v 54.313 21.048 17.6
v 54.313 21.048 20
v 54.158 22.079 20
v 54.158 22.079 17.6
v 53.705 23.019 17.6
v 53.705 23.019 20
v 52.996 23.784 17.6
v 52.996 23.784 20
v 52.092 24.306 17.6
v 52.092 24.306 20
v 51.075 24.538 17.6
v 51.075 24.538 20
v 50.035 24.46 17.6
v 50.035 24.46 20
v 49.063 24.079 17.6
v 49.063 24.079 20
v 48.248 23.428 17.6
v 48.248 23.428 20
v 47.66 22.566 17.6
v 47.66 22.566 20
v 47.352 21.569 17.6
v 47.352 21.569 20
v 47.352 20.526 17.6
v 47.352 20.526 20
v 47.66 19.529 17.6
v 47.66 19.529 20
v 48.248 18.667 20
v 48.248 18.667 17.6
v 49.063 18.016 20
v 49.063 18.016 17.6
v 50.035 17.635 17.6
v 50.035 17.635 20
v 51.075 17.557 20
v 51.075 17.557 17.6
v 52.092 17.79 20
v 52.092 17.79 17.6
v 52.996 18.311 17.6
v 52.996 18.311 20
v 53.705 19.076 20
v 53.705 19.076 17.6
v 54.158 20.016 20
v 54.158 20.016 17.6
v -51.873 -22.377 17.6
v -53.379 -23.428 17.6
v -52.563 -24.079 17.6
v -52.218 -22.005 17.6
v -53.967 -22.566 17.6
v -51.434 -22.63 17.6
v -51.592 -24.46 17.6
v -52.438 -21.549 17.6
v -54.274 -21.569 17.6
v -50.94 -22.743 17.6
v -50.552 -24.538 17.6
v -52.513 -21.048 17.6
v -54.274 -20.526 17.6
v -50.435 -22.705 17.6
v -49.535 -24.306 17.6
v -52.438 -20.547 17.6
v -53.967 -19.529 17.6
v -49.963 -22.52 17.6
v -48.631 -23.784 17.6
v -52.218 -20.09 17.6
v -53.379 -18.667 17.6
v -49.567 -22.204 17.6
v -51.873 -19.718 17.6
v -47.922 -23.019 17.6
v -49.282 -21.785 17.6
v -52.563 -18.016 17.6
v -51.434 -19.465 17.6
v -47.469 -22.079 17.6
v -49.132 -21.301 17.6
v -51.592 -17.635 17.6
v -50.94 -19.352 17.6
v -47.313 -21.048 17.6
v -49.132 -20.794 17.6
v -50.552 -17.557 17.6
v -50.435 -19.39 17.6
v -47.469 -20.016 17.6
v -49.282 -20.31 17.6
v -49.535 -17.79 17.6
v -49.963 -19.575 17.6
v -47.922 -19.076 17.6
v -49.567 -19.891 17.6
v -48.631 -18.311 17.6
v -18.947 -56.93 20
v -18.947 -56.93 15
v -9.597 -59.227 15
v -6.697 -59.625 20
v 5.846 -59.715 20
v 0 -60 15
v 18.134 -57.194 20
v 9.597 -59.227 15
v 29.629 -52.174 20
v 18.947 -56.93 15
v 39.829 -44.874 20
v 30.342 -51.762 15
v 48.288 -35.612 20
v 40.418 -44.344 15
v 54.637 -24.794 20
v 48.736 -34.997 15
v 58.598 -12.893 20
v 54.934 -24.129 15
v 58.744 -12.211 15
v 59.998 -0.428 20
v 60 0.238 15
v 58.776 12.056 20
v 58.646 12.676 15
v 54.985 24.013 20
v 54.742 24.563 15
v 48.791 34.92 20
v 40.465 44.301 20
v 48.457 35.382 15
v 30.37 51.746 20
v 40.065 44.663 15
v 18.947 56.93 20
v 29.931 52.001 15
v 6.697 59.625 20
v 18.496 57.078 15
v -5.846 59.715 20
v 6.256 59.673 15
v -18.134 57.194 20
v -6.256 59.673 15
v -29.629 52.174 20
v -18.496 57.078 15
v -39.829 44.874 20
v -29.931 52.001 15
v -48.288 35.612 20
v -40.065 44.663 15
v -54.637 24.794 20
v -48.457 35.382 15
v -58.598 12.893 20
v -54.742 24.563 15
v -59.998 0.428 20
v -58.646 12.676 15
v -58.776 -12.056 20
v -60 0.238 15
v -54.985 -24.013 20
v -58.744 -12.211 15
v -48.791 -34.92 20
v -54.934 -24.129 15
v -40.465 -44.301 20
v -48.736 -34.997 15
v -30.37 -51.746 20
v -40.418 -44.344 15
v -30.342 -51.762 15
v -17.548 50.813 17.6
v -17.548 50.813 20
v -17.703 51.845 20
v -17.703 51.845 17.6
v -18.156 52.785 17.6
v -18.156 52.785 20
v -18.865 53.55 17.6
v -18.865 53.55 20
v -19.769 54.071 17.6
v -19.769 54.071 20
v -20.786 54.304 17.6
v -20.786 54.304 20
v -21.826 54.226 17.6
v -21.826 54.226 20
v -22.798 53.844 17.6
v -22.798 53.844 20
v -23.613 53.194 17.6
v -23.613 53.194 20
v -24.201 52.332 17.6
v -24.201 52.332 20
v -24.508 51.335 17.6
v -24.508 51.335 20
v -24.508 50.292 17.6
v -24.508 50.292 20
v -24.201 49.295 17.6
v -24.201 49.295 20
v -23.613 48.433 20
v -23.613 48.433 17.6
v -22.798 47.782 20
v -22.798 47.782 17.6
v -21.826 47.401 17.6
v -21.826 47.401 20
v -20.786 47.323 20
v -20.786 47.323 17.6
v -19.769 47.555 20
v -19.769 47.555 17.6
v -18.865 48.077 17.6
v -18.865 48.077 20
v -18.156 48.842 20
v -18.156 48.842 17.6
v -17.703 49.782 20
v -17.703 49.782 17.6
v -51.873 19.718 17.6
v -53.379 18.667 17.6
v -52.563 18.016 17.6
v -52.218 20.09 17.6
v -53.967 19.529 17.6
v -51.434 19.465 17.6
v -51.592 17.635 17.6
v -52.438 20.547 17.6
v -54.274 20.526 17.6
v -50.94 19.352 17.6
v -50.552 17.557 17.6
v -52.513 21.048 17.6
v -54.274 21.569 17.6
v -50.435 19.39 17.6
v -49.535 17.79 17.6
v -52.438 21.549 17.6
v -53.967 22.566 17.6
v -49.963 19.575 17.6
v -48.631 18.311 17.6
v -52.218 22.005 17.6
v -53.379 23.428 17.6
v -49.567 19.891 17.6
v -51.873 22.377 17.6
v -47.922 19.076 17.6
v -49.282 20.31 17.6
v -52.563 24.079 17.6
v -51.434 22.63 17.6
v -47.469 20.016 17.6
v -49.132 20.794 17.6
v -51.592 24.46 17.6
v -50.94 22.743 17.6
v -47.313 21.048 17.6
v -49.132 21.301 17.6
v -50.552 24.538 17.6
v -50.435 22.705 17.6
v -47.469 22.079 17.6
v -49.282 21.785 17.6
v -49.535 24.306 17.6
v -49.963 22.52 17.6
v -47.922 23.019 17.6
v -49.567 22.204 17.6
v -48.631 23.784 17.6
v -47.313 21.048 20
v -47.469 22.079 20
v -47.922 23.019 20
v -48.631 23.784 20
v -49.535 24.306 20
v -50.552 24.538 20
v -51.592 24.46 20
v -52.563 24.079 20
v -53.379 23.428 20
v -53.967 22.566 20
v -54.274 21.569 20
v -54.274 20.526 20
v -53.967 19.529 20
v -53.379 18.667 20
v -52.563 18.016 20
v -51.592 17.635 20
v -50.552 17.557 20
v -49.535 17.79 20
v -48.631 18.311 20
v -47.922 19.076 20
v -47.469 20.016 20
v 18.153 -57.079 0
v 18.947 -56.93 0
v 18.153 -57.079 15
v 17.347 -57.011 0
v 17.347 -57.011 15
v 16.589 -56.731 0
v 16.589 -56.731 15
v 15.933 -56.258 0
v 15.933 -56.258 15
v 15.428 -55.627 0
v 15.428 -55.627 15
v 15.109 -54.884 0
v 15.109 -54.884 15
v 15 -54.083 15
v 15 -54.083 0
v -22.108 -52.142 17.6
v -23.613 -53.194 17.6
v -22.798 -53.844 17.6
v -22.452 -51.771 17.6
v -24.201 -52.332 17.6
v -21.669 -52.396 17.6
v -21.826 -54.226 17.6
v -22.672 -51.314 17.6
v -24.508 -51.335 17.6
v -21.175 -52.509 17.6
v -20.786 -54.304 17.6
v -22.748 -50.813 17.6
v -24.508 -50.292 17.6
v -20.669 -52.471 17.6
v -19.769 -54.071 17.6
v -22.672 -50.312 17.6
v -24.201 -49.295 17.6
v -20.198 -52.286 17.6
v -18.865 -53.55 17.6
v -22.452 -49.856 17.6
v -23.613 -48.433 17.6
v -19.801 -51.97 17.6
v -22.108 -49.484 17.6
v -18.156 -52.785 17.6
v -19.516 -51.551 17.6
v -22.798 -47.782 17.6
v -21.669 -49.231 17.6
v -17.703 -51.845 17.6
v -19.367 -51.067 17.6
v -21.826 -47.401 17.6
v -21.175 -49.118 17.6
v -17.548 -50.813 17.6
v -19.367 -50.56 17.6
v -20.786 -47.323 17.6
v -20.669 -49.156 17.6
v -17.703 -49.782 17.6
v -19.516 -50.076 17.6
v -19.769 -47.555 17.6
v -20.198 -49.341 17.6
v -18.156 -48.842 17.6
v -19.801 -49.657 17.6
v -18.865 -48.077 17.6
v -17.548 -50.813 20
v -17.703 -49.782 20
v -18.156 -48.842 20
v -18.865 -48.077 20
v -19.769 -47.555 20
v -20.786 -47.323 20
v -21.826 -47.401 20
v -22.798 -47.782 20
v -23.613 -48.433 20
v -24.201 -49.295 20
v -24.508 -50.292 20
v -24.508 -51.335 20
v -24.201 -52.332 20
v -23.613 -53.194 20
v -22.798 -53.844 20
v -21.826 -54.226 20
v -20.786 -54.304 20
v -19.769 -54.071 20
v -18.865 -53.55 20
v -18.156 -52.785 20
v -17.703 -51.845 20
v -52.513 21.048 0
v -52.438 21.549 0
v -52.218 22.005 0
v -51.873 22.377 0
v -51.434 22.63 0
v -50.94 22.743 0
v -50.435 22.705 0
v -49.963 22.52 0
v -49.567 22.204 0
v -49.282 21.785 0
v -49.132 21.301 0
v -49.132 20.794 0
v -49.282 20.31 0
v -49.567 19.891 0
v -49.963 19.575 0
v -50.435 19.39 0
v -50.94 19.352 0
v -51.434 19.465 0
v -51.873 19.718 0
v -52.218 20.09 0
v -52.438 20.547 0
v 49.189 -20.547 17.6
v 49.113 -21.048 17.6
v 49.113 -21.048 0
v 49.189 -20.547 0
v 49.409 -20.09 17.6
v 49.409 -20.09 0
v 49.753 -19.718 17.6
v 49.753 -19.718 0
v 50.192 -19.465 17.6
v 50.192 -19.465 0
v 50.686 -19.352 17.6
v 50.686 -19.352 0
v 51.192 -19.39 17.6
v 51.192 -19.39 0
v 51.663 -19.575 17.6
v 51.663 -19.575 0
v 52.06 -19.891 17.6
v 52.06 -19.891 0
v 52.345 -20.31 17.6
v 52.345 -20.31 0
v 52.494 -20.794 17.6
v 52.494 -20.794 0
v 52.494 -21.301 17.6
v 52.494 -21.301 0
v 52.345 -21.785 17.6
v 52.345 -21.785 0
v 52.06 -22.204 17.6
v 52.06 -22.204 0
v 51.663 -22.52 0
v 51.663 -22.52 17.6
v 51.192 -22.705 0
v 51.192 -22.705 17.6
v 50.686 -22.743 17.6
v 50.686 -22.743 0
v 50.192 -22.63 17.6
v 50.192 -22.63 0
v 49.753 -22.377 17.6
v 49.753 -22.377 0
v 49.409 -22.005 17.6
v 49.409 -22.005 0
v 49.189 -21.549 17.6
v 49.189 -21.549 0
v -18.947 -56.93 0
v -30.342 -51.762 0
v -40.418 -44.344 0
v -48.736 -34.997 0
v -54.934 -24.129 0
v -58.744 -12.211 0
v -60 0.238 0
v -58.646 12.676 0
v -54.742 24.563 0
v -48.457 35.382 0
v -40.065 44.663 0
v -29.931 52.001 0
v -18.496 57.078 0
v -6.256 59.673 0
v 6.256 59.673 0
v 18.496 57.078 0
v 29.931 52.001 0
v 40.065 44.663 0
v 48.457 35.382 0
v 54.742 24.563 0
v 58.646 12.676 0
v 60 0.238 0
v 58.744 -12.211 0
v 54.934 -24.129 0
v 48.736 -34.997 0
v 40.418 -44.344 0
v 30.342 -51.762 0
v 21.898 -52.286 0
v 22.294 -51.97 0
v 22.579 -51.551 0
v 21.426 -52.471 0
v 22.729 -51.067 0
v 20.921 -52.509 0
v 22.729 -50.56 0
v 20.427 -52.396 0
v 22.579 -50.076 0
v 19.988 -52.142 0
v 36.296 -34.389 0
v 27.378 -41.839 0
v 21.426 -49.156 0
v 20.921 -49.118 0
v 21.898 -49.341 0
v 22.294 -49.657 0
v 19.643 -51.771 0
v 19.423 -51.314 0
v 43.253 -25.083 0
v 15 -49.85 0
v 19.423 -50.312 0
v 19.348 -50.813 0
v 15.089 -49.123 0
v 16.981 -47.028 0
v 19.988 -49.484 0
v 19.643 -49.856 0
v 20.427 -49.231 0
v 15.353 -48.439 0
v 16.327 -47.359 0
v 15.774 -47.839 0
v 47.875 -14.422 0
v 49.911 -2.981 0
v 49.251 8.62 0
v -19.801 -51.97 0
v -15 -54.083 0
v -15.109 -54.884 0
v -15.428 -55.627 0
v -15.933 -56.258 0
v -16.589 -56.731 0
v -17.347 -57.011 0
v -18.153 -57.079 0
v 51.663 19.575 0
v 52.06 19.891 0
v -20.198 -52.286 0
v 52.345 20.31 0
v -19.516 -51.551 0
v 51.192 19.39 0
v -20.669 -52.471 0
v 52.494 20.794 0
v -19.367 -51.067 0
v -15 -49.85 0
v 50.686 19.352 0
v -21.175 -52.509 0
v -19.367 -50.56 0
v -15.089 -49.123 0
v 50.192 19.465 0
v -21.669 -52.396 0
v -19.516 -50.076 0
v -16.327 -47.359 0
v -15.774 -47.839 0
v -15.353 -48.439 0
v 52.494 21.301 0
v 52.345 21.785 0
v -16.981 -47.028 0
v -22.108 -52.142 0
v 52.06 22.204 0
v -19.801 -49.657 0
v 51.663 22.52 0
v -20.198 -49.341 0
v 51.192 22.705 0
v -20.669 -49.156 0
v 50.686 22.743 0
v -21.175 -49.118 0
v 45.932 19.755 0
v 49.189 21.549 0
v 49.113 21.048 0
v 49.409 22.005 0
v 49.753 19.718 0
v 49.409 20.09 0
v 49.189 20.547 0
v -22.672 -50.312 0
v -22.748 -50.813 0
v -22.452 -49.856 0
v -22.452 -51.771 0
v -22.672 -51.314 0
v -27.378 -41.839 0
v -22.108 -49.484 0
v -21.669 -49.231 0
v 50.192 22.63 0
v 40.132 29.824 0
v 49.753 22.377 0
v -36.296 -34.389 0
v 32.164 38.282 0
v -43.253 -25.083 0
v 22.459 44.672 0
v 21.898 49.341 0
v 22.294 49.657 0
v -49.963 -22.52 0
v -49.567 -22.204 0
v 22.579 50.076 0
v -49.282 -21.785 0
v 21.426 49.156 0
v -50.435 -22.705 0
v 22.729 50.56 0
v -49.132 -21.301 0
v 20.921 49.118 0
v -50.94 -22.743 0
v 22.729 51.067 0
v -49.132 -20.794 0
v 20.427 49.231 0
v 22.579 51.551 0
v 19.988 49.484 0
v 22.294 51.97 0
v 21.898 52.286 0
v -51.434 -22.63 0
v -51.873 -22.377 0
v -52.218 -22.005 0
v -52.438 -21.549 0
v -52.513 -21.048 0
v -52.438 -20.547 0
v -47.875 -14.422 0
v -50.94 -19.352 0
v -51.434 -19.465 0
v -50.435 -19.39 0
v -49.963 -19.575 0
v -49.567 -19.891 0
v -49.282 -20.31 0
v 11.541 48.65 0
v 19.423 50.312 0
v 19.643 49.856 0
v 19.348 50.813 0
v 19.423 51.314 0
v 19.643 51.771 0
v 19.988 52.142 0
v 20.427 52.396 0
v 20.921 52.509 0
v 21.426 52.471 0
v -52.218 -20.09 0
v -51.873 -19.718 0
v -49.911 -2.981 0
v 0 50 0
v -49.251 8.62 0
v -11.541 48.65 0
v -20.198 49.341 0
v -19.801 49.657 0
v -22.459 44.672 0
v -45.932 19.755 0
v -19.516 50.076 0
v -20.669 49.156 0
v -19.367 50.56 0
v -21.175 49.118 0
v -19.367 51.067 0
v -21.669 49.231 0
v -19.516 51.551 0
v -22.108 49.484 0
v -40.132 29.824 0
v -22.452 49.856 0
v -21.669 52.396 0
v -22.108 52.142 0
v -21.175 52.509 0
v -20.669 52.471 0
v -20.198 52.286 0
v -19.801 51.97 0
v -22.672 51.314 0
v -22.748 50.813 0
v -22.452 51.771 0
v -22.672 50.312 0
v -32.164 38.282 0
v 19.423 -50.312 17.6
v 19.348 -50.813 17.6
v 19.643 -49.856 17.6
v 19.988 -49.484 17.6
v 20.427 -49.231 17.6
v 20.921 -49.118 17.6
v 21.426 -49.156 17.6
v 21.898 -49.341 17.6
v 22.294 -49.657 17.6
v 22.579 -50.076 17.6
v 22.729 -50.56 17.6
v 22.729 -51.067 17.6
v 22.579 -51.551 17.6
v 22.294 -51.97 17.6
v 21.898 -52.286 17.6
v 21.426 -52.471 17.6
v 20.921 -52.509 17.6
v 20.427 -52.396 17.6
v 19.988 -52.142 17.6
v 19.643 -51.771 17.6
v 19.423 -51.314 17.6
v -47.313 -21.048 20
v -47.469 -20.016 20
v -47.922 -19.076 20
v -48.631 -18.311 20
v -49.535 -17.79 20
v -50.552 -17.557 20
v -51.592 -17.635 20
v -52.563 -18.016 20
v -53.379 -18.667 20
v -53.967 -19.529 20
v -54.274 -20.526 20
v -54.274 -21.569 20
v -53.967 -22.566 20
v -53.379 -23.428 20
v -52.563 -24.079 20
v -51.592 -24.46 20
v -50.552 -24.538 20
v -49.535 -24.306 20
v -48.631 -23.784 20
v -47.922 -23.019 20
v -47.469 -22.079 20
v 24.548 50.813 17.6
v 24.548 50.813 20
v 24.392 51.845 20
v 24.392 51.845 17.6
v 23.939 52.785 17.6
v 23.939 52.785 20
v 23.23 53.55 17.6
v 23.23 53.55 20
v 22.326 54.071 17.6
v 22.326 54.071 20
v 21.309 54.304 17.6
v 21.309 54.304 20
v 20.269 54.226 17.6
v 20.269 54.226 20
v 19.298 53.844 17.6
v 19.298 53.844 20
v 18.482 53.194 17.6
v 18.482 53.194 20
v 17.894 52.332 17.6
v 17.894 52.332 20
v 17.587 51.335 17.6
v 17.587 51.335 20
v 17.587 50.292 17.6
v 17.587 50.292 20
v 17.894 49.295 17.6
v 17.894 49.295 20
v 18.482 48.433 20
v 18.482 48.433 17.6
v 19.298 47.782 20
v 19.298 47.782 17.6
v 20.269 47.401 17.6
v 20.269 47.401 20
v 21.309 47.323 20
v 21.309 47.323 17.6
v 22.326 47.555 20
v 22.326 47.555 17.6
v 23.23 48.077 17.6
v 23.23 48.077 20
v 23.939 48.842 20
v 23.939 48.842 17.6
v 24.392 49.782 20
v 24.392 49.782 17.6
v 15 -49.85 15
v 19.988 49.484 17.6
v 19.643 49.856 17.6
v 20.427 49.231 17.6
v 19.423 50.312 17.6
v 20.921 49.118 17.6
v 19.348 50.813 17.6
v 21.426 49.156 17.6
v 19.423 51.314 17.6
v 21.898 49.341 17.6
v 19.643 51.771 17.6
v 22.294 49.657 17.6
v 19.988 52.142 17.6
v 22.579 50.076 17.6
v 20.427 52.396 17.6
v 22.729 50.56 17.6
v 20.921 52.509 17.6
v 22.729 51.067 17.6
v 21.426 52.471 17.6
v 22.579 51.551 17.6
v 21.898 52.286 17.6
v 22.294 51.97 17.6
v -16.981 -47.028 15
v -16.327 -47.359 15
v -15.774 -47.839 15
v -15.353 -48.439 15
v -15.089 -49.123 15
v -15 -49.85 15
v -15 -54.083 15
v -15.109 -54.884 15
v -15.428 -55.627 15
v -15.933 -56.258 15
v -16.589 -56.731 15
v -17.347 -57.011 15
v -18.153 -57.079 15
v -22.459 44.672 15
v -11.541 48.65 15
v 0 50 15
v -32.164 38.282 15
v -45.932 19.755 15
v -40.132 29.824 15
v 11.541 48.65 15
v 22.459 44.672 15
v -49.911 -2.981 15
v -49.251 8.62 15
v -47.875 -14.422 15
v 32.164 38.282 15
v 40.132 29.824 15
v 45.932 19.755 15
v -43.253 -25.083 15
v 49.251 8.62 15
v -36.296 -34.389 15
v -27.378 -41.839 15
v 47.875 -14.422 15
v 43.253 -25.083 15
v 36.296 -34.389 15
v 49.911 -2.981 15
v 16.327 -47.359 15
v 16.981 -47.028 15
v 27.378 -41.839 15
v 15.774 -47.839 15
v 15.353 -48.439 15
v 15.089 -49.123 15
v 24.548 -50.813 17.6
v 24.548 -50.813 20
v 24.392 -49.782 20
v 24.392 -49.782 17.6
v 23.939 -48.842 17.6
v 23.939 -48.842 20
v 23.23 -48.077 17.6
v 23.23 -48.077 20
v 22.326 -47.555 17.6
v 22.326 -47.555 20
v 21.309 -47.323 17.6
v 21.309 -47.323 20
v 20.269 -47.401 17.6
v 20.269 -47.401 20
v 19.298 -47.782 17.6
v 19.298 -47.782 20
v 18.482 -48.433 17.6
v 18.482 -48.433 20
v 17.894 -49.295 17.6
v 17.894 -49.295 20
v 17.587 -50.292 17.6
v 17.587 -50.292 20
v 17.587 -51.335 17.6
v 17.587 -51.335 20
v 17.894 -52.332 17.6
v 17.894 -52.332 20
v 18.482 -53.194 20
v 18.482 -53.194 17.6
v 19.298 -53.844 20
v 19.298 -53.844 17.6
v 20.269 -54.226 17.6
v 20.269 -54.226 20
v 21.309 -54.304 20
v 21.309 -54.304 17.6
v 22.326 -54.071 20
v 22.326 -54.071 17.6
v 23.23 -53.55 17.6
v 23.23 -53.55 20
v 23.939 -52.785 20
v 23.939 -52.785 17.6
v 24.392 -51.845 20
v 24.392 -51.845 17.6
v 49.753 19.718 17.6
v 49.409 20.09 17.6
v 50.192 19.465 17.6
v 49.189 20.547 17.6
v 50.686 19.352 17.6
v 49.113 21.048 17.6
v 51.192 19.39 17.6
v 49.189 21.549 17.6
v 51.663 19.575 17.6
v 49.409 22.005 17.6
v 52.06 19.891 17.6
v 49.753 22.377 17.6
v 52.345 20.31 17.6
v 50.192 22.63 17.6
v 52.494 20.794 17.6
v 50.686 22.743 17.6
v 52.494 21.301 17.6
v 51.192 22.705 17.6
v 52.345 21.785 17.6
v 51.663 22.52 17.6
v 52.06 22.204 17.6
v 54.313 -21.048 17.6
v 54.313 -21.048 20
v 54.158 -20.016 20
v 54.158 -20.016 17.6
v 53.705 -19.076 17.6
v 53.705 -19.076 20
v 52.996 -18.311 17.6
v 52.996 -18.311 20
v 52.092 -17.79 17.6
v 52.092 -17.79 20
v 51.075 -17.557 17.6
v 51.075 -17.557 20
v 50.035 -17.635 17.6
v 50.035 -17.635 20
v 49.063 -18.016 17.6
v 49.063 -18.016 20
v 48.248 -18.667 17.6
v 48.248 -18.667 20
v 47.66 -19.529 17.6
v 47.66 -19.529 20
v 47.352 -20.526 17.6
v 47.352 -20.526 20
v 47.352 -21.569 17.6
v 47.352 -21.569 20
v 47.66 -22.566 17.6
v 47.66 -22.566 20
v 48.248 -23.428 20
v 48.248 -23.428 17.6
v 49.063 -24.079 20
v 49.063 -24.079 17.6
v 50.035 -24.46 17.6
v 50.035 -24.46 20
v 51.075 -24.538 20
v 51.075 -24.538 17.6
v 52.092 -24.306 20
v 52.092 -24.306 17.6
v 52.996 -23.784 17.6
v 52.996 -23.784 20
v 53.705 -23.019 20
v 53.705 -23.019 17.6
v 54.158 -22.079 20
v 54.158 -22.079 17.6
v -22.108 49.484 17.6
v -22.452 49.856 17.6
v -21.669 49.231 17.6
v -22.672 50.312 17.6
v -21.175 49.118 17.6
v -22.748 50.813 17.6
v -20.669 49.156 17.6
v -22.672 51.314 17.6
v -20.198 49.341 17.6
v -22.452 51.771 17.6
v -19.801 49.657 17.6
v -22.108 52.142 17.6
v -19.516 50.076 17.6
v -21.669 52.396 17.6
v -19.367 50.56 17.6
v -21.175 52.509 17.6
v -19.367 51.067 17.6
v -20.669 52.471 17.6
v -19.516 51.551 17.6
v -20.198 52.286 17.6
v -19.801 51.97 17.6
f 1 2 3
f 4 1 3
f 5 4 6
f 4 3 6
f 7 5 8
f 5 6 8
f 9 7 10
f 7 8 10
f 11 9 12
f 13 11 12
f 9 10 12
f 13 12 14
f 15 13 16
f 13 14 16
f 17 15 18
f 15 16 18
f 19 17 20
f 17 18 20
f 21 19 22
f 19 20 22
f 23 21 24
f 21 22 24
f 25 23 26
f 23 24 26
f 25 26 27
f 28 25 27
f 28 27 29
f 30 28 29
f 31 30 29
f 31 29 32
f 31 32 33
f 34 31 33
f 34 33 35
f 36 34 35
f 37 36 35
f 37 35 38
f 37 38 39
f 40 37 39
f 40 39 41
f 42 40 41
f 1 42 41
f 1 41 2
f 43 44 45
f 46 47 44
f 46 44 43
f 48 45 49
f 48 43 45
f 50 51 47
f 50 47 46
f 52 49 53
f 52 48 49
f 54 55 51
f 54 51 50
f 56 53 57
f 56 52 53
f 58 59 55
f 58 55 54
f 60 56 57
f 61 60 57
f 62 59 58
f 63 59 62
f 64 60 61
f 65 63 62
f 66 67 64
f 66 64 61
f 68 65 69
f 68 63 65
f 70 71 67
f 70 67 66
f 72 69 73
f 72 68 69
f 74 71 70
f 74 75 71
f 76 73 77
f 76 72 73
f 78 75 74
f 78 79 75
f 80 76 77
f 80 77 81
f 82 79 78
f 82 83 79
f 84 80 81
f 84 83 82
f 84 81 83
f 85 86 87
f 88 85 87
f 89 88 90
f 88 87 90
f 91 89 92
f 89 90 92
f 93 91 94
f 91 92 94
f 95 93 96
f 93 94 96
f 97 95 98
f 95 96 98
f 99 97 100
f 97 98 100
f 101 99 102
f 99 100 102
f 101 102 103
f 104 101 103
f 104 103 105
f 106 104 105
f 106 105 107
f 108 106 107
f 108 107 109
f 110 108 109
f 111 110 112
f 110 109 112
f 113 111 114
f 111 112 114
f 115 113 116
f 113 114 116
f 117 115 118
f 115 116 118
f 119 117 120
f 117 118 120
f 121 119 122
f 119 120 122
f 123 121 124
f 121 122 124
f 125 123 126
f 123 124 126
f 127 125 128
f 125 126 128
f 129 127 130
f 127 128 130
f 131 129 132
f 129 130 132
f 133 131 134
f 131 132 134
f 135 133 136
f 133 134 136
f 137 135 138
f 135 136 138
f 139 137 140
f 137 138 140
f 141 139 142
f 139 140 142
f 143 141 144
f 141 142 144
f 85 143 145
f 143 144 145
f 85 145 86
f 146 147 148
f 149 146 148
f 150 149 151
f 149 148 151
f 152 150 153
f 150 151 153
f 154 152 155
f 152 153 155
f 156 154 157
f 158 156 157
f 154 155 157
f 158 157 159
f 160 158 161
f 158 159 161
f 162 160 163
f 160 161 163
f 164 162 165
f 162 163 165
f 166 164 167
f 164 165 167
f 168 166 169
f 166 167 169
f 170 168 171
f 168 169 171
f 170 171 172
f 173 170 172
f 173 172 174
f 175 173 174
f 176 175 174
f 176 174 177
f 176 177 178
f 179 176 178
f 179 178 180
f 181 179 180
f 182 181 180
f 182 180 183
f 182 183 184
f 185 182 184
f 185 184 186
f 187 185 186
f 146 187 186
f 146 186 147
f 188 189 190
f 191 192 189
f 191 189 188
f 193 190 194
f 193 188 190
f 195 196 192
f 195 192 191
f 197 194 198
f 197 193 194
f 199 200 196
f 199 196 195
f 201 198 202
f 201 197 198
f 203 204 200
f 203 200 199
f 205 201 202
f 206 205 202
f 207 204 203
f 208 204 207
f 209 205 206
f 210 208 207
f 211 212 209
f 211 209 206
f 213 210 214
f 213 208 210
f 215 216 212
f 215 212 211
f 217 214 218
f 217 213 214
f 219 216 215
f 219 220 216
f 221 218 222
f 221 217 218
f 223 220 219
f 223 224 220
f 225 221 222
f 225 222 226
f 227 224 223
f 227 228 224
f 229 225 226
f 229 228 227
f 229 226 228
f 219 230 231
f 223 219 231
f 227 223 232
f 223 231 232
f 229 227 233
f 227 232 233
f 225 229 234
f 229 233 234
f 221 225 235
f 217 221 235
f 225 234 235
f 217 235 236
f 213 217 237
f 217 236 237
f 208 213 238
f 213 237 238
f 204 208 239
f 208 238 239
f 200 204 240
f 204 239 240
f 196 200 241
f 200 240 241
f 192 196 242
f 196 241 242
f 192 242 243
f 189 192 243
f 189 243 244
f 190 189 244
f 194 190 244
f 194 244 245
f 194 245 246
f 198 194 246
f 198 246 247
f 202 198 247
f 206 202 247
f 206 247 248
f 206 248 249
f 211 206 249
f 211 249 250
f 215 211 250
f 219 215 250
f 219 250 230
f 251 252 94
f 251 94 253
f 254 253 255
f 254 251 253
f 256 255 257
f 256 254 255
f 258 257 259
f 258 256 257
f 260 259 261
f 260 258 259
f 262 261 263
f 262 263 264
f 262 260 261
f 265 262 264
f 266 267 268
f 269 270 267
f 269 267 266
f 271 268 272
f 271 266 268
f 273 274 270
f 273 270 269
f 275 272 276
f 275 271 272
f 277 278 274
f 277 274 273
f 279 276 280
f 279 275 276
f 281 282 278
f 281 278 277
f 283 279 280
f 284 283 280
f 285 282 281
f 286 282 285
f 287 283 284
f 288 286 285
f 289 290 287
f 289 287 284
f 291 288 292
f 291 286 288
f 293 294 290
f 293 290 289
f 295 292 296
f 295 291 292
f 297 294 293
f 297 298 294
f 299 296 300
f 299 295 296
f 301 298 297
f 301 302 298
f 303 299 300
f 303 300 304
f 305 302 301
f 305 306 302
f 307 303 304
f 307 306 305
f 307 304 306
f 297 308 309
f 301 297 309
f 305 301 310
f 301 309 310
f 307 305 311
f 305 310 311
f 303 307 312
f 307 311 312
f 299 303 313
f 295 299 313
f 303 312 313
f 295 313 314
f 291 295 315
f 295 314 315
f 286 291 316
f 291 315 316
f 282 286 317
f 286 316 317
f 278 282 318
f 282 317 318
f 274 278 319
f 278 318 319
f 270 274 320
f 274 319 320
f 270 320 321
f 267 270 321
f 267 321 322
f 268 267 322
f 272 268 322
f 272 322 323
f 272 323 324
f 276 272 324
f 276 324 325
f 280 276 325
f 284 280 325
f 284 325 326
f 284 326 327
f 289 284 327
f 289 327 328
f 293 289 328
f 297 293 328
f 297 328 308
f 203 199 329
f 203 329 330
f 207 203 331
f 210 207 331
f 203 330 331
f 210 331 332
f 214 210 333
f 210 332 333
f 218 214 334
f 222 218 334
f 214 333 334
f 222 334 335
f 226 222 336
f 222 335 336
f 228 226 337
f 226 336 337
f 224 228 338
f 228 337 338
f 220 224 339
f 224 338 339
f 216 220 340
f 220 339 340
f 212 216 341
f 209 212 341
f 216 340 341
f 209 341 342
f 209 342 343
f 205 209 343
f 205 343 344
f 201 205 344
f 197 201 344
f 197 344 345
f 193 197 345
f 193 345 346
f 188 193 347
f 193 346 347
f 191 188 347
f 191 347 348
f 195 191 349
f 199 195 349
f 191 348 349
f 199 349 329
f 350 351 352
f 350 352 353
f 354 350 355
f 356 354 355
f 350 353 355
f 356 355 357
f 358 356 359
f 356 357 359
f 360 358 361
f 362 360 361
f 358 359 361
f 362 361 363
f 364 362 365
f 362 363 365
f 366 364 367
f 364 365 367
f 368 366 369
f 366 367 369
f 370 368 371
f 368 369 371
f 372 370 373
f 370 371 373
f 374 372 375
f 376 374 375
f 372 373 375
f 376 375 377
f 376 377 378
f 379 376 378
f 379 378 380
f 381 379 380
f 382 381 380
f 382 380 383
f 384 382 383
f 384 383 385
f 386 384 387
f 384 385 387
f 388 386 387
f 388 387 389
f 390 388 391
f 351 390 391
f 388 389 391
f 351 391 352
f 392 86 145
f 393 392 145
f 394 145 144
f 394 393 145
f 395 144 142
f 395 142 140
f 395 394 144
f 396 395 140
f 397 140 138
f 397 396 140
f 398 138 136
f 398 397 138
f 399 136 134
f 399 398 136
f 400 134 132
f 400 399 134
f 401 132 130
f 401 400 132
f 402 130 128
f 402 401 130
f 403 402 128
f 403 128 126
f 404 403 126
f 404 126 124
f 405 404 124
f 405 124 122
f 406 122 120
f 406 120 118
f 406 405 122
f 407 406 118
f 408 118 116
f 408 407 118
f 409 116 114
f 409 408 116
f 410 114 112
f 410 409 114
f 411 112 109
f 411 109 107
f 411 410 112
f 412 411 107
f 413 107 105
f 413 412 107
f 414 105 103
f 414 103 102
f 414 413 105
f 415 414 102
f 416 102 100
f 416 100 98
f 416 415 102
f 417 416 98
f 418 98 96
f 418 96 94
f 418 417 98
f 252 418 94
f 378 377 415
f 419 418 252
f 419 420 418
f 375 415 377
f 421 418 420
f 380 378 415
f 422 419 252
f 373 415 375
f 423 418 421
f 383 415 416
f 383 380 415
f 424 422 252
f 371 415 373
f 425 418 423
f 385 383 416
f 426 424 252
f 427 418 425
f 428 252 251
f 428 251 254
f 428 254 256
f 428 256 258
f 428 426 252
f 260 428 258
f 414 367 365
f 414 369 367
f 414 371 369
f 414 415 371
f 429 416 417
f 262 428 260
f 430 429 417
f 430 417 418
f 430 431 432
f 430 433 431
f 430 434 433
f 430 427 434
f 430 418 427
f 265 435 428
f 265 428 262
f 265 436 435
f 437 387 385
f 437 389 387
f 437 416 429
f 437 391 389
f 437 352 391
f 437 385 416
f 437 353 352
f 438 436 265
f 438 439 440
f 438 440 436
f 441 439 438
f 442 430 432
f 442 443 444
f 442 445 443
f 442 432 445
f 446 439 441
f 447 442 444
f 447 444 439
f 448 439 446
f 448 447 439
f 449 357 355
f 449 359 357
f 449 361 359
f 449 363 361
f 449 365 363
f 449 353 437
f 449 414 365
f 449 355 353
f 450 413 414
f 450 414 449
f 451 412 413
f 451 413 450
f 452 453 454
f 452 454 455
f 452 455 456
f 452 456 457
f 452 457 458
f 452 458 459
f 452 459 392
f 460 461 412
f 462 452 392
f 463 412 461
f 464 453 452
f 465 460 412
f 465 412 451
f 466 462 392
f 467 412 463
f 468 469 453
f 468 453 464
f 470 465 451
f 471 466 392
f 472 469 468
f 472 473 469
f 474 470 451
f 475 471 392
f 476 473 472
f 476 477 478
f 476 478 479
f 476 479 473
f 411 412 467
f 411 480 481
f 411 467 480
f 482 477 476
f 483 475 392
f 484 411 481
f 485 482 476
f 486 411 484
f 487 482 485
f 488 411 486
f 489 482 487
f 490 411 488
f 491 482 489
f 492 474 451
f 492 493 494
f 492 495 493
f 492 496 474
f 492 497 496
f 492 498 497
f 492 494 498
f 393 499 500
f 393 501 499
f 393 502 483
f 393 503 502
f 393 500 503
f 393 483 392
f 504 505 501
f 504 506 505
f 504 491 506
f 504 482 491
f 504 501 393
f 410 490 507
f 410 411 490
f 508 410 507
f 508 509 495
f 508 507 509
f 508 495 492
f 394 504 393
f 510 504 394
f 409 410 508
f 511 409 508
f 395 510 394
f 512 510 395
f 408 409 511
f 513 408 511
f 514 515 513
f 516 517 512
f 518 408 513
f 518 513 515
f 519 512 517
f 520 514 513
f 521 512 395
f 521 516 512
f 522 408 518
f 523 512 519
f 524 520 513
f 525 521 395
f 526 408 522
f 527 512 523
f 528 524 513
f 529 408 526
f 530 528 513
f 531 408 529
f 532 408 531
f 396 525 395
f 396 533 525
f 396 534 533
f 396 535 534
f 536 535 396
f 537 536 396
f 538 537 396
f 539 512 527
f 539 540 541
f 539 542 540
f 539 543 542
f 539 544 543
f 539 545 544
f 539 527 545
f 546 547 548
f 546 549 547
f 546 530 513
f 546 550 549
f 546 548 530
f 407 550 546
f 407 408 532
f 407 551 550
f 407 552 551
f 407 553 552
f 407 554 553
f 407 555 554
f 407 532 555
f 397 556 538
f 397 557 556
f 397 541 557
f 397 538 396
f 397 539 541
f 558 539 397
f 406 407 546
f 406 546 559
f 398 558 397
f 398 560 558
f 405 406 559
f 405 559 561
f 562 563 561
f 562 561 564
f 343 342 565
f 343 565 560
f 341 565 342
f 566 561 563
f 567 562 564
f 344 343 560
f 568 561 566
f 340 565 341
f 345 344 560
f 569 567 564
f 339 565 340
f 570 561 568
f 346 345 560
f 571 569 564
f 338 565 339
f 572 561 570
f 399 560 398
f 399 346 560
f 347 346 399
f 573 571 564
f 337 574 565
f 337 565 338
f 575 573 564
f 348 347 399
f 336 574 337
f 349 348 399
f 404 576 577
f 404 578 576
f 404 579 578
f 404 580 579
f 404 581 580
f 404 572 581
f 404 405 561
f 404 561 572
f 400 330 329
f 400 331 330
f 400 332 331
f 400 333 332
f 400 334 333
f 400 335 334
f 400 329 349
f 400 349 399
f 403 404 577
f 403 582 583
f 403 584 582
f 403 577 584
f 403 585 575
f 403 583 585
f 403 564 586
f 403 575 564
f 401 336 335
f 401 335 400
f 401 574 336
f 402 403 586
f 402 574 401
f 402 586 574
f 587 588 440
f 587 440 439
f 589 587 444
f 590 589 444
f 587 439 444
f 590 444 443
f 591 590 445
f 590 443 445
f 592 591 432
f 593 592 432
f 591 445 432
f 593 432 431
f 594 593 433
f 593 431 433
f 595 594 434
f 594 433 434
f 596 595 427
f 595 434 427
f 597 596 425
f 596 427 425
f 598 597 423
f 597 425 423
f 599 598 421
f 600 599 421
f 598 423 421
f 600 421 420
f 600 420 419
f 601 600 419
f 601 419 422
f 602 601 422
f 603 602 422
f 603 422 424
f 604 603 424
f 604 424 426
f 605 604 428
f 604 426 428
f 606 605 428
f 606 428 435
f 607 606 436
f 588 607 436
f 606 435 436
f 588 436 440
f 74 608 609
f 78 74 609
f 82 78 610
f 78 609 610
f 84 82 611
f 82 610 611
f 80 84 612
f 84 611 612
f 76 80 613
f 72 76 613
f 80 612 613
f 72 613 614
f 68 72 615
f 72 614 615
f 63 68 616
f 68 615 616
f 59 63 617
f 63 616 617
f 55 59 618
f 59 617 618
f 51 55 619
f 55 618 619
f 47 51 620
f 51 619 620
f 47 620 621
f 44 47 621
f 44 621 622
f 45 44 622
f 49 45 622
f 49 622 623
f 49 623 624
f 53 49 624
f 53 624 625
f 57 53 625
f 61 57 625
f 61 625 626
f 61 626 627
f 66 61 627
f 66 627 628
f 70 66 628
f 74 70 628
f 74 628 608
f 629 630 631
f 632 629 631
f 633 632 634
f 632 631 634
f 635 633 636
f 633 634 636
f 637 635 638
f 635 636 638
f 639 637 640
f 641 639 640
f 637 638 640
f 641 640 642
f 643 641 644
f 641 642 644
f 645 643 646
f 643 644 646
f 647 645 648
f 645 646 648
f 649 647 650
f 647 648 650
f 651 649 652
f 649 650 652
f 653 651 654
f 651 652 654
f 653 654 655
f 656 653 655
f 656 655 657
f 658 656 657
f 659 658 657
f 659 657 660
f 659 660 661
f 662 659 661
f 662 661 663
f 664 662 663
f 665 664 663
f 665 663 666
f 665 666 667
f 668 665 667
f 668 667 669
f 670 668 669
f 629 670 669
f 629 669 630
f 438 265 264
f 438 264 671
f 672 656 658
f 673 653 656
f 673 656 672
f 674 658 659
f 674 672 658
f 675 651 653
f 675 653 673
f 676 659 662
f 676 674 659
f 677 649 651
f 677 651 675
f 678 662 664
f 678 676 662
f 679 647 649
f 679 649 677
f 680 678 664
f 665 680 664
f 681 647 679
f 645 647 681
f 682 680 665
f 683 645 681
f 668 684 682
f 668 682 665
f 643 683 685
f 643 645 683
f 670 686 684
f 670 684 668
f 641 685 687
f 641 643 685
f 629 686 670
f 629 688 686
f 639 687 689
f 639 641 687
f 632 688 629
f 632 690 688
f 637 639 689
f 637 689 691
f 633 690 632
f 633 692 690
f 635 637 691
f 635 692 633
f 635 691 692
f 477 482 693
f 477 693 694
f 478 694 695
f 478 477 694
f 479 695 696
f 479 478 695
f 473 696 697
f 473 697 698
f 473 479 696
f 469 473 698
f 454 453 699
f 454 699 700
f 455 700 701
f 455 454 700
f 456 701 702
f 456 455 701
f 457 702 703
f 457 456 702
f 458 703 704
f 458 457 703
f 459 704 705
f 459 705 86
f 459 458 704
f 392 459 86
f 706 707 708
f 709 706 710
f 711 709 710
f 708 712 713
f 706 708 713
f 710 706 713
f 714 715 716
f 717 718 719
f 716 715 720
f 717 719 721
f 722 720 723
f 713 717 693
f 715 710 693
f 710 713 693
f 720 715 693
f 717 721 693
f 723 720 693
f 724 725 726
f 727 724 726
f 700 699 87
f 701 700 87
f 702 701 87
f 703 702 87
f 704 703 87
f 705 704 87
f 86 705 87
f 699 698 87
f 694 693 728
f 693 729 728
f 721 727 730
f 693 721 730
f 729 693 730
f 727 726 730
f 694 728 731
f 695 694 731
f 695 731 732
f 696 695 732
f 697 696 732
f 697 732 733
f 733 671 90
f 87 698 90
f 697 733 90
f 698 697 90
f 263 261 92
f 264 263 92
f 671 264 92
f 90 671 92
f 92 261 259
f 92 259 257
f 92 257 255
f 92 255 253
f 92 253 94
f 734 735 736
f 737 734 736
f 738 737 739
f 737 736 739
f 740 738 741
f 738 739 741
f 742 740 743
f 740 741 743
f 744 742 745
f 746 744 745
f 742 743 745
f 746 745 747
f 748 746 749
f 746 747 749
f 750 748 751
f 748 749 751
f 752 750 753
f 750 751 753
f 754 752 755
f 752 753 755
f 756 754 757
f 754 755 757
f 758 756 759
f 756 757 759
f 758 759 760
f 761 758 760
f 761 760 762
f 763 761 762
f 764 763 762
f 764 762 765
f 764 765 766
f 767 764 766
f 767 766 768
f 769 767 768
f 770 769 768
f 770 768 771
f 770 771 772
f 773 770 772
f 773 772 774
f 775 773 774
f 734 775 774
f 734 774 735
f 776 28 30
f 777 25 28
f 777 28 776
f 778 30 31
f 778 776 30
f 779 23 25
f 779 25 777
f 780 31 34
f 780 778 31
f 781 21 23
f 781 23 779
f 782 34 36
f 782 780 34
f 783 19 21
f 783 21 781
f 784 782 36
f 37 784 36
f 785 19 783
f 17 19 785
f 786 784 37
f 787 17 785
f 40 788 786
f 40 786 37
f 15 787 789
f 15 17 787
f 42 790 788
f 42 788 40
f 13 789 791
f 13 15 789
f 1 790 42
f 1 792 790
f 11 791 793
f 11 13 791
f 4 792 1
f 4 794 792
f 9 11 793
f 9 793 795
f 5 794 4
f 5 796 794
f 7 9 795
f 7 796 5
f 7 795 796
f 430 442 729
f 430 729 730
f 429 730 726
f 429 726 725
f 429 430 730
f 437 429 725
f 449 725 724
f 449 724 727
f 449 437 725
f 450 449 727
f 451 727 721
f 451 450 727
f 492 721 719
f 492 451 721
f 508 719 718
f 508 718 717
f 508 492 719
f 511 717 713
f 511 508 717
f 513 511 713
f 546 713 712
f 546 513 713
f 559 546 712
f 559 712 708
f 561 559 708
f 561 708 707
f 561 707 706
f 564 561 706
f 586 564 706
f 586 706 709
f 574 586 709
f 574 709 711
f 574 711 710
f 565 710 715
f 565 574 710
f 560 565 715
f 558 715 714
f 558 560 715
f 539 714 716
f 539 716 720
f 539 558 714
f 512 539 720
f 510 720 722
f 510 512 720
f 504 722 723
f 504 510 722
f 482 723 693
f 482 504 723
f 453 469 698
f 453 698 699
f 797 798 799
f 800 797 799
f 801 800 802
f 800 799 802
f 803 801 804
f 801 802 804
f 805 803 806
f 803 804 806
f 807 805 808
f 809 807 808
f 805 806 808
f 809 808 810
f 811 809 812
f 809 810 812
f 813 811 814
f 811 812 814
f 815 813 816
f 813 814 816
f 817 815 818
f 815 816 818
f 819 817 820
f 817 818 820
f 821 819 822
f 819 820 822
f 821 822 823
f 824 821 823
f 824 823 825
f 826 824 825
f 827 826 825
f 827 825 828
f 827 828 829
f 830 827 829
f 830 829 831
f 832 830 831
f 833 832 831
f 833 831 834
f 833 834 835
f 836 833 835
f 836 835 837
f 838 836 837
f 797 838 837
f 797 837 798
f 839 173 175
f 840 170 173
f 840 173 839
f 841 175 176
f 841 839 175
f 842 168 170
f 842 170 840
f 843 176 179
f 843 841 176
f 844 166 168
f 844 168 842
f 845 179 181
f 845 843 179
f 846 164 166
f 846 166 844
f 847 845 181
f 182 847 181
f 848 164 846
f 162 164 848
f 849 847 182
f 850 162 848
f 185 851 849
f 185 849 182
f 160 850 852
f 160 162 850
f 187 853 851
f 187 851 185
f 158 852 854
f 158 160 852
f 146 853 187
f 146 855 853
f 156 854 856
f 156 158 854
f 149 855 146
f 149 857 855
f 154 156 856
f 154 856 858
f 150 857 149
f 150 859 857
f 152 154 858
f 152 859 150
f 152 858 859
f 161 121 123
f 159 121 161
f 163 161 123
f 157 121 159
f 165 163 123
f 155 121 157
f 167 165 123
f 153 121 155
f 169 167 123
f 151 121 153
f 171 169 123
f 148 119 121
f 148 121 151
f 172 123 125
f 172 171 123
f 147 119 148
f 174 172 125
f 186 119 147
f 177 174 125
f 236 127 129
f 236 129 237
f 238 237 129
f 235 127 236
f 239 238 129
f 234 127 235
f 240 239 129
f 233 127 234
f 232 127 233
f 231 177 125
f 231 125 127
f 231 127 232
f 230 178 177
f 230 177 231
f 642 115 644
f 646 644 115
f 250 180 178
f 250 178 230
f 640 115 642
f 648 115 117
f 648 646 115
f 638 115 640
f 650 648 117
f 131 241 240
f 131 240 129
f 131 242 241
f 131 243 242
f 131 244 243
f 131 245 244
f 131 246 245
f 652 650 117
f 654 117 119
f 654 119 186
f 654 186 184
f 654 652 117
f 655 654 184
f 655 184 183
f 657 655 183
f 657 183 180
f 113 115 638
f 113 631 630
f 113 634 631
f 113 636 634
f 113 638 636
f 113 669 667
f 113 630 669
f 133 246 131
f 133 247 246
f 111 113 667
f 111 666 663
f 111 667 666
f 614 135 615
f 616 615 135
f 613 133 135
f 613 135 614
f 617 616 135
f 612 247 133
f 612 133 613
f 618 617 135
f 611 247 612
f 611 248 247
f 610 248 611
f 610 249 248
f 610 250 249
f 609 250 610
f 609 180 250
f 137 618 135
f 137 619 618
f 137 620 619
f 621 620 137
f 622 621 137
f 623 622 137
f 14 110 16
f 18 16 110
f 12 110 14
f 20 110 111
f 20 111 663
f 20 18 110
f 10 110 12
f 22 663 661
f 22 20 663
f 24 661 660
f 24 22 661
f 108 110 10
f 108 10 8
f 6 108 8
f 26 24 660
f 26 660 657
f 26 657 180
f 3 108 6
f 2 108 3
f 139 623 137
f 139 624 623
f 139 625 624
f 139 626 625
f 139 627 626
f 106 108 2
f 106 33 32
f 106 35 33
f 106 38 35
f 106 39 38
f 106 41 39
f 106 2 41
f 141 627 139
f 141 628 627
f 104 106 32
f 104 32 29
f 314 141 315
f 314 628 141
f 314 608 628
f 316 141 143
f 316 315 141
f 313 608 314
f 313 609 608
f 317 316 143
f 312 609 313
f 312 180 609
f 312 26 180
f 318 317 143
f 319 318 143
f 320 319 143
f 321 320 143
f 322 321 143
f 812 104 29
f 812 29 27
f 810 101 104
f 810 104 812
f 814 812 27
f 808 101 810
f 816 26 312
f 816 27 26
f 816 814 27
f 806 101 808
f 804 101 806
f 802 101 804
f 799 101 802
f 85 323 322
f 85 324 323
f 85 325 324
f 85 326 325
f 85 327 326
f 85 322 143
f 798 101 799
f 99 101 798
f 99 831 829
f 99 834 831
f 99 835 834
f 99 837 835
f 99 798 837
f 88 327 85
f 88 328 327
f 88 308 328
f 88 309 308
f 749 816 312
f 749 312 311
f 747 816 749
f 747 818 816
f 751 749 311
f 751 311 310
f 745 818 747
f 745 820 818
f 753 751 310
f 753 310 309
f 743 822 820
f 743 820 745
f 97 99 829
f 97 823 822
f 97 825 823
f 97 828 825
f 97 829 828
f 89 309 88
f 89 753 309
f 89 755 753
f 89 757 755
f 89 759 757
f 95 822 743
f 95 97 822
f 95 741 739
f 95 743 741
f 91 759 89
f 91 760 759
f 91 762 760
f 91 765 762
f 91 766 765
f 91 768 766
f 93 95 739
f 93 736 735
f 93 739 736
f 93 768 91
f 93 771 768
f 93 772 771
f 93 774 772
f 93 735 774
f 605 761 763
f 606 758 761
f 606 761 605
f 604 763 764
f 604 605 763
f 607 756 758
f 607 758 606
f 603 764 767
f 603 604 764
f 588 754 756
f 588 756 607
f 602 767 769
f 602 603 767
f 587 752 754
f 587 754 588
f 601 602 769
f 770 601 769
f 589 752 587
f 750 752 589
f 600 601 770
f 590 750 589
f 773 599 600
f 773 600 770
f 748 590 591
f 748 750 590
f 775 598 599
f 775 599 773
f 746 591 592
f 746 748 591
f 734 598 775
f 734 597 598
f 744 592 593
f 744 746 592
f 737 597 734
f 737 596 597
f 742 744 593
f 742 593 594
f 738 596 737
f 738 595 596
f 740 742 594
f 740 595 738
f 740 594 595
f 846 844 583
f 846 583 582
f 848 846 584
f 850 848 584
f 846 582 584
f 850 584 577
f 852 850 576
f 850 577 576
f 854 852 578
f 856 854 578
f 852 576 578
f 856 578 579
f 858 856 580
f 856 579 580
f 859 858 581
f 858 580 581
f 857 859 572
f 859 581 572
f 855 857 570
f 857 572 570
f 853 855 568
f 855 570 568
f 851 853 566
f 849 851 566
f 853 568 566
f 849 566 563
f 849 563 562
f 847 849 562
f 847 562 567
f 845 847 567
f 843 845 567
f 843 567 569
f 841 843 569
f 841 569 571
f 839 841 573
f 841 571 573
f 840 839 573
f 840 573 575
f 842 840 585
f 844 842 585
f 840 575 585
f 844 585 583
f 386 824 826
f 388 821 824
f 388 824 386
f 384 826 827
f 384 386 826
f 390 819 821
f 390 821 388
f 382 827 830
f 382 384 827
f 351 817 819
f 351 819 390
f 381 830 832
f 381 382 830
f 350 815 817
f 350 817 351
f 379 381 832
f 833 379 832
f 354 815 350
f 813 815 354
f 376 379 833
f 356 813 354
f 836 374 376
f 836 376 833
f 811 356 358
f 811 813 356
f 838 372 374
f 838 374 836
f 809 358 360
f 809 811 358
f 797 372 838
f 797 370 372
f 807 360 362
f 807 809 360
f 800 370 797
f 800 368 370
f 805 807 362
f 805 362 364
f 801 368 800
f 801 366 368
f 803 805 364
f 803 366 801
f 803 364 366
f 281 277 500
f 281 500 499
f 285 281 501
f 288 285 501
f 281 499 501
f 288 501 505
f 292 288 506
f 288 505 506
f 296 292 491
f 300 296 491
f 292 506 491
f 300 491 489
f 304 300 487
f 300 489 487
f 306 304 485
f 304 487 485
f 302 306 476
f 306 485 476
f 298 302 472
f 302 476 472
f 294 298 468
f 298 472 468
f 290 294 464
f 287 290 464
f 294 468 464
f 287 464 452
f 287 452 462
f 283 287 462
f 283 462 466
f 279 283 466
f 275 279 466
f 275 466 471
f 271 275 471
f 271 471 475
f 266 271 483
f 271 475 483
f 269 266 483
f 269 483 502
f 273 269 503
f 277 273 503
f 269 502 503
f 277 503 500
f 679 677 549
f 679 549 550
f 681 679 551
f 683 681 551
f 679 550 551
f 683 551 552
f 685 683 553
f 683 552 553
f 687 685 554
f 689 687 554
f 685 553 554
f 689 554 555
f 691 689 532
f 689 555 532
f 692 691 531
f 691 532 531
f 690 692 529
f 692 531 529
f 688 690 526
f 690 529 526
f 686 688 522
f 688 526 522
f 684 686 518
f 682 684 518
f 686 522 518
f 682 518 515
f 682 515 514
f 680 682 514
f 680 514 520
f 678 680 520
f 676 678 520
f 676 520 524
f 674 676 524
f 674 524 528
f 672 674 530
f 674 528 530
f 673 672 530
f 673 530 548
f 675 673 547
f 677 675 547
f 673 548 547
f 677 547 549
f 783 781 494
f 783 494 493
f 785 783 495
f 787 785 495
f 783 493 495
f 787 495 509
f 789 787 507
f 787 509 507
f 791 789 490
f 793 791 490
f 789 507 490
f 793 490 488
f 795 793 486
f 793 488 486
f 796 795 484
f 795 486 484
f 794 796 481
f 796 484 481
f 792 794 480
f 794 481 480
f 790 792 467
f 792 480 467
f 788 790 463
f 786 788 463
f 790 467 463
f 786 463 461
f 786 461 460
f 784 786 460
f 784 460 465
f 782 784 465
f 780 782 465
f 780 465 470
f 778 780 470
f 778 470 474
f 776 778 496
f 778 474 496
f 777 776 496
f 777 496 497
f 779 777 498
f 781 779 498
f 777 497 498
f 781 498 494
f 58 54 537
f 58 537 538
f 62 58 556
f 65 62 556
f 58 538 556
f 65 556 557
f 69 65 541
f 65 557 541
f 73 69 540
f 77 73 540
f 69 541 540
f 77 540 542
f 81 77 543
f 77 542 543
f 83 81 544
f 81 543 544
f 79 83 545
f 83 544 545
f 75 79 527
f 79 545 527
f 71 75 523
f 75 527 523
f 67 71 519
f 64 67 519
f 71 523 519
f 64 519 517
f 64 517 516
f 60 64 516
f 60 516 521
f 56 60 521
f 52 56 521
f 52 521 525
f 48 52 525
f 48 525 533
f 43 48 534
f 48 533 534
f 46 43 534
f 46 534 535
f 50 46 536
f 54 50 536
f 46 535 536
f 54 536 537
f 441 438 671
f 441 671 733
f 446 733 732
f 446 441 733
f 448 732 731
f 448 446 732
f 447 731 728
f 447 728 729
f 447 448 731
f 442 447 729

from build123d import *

# Parameters (mm, degrees)
SALIENTE_EXTRUIR1_DEPTH                              = 15
CROQUIS2_R                                           = 60
SALIENTE_EXTRUIR2_DEPTH                              = 5
REFRENTADO_PARA_TORNILLO_CON_CABEZA_TRON_D           = 3.4
REFRENTADO_PARA_TORNILLO_CON_CABEZA_TRON_CBORE_D     = 7
REFRENTADO_PARA_TORNILLO_CON_CABEZA_TRON_CBORE_DEPTH = 2.4


with BuildPart() as part:
    # Croquis1 → Saliente-Extruir1 (new body)
    with BuildSketch(Plane.XY):
        with BuildLine():
            Line((-15, -49.849774322), (-15, -54.083269132))
            ThreePointArc((-15, -54.083269132), (-16.245307044, -56.516590449), (-18.947368421, -56.929756981))
            ThreePointArc((-18.947368421, -56.929756981), (0, 60), (18.947368421, -56.929756981))
            ThreePointArc((18.947368421, -56.929756981), (16.245307044, -56.516590449), (15, -54.083269132))
            Line((15, -54.083269132), (15, -49.849774322))
            ThreePointArc((15, -49.849774322), (15.544739955, -48.125912926), (16.981132075, -47.028088983))
            ThreePointArc((16.981132075, -47.028088983), (0, 50), (-16.981132075, -47.028088983))
            ThreePointArc((-16.981132075, -47.028088983), (-15.544739955, -48.125912926), (-15, -49.849774322))
        make_face()
    extrude(amount=SALIENTE_EXTRUIR1_DEPTH)

    # Croquis2 → Saliente-Extruir2 (add)
    with BuildSketch(Plane.XY.offset(15)):
        with Locations(Location((0, 0, 0), (0, 0, 251.591519829))):
            Circle(CROQUIS2_R)
    extrude(amount=SALIENTE_EXTRUIR2_DEPTH)

    # Refrentado para tornillo con cabeza troncocónica de M31 (through all)
    with Locations(Plane.XY.offset(20)):
        with Locations((-21.04758878, 50.813374288), (21.04758878, 50.813374288), (50.813374288, 21.04758878), (50.813374288, -21.04758878), (21.04758878, -50.813374288), (-21.04758878, -50.813374288), (-50.813374288, -21.04758878), (-50.813374288, 21.04758878)):
            CounterBoreHole(REFRENTADO_PARA_TORNILLO_CON_CABEZA_TRON_D / 2, REFRENTADO_PARA_TORNILLO_CON_CABEZA_TRON_CBORE_D / 2, REFRENTADO_PARA_TORNILLO_CON_CABEZA_TRON_CBORE_DEPTH)


solid = part.part
